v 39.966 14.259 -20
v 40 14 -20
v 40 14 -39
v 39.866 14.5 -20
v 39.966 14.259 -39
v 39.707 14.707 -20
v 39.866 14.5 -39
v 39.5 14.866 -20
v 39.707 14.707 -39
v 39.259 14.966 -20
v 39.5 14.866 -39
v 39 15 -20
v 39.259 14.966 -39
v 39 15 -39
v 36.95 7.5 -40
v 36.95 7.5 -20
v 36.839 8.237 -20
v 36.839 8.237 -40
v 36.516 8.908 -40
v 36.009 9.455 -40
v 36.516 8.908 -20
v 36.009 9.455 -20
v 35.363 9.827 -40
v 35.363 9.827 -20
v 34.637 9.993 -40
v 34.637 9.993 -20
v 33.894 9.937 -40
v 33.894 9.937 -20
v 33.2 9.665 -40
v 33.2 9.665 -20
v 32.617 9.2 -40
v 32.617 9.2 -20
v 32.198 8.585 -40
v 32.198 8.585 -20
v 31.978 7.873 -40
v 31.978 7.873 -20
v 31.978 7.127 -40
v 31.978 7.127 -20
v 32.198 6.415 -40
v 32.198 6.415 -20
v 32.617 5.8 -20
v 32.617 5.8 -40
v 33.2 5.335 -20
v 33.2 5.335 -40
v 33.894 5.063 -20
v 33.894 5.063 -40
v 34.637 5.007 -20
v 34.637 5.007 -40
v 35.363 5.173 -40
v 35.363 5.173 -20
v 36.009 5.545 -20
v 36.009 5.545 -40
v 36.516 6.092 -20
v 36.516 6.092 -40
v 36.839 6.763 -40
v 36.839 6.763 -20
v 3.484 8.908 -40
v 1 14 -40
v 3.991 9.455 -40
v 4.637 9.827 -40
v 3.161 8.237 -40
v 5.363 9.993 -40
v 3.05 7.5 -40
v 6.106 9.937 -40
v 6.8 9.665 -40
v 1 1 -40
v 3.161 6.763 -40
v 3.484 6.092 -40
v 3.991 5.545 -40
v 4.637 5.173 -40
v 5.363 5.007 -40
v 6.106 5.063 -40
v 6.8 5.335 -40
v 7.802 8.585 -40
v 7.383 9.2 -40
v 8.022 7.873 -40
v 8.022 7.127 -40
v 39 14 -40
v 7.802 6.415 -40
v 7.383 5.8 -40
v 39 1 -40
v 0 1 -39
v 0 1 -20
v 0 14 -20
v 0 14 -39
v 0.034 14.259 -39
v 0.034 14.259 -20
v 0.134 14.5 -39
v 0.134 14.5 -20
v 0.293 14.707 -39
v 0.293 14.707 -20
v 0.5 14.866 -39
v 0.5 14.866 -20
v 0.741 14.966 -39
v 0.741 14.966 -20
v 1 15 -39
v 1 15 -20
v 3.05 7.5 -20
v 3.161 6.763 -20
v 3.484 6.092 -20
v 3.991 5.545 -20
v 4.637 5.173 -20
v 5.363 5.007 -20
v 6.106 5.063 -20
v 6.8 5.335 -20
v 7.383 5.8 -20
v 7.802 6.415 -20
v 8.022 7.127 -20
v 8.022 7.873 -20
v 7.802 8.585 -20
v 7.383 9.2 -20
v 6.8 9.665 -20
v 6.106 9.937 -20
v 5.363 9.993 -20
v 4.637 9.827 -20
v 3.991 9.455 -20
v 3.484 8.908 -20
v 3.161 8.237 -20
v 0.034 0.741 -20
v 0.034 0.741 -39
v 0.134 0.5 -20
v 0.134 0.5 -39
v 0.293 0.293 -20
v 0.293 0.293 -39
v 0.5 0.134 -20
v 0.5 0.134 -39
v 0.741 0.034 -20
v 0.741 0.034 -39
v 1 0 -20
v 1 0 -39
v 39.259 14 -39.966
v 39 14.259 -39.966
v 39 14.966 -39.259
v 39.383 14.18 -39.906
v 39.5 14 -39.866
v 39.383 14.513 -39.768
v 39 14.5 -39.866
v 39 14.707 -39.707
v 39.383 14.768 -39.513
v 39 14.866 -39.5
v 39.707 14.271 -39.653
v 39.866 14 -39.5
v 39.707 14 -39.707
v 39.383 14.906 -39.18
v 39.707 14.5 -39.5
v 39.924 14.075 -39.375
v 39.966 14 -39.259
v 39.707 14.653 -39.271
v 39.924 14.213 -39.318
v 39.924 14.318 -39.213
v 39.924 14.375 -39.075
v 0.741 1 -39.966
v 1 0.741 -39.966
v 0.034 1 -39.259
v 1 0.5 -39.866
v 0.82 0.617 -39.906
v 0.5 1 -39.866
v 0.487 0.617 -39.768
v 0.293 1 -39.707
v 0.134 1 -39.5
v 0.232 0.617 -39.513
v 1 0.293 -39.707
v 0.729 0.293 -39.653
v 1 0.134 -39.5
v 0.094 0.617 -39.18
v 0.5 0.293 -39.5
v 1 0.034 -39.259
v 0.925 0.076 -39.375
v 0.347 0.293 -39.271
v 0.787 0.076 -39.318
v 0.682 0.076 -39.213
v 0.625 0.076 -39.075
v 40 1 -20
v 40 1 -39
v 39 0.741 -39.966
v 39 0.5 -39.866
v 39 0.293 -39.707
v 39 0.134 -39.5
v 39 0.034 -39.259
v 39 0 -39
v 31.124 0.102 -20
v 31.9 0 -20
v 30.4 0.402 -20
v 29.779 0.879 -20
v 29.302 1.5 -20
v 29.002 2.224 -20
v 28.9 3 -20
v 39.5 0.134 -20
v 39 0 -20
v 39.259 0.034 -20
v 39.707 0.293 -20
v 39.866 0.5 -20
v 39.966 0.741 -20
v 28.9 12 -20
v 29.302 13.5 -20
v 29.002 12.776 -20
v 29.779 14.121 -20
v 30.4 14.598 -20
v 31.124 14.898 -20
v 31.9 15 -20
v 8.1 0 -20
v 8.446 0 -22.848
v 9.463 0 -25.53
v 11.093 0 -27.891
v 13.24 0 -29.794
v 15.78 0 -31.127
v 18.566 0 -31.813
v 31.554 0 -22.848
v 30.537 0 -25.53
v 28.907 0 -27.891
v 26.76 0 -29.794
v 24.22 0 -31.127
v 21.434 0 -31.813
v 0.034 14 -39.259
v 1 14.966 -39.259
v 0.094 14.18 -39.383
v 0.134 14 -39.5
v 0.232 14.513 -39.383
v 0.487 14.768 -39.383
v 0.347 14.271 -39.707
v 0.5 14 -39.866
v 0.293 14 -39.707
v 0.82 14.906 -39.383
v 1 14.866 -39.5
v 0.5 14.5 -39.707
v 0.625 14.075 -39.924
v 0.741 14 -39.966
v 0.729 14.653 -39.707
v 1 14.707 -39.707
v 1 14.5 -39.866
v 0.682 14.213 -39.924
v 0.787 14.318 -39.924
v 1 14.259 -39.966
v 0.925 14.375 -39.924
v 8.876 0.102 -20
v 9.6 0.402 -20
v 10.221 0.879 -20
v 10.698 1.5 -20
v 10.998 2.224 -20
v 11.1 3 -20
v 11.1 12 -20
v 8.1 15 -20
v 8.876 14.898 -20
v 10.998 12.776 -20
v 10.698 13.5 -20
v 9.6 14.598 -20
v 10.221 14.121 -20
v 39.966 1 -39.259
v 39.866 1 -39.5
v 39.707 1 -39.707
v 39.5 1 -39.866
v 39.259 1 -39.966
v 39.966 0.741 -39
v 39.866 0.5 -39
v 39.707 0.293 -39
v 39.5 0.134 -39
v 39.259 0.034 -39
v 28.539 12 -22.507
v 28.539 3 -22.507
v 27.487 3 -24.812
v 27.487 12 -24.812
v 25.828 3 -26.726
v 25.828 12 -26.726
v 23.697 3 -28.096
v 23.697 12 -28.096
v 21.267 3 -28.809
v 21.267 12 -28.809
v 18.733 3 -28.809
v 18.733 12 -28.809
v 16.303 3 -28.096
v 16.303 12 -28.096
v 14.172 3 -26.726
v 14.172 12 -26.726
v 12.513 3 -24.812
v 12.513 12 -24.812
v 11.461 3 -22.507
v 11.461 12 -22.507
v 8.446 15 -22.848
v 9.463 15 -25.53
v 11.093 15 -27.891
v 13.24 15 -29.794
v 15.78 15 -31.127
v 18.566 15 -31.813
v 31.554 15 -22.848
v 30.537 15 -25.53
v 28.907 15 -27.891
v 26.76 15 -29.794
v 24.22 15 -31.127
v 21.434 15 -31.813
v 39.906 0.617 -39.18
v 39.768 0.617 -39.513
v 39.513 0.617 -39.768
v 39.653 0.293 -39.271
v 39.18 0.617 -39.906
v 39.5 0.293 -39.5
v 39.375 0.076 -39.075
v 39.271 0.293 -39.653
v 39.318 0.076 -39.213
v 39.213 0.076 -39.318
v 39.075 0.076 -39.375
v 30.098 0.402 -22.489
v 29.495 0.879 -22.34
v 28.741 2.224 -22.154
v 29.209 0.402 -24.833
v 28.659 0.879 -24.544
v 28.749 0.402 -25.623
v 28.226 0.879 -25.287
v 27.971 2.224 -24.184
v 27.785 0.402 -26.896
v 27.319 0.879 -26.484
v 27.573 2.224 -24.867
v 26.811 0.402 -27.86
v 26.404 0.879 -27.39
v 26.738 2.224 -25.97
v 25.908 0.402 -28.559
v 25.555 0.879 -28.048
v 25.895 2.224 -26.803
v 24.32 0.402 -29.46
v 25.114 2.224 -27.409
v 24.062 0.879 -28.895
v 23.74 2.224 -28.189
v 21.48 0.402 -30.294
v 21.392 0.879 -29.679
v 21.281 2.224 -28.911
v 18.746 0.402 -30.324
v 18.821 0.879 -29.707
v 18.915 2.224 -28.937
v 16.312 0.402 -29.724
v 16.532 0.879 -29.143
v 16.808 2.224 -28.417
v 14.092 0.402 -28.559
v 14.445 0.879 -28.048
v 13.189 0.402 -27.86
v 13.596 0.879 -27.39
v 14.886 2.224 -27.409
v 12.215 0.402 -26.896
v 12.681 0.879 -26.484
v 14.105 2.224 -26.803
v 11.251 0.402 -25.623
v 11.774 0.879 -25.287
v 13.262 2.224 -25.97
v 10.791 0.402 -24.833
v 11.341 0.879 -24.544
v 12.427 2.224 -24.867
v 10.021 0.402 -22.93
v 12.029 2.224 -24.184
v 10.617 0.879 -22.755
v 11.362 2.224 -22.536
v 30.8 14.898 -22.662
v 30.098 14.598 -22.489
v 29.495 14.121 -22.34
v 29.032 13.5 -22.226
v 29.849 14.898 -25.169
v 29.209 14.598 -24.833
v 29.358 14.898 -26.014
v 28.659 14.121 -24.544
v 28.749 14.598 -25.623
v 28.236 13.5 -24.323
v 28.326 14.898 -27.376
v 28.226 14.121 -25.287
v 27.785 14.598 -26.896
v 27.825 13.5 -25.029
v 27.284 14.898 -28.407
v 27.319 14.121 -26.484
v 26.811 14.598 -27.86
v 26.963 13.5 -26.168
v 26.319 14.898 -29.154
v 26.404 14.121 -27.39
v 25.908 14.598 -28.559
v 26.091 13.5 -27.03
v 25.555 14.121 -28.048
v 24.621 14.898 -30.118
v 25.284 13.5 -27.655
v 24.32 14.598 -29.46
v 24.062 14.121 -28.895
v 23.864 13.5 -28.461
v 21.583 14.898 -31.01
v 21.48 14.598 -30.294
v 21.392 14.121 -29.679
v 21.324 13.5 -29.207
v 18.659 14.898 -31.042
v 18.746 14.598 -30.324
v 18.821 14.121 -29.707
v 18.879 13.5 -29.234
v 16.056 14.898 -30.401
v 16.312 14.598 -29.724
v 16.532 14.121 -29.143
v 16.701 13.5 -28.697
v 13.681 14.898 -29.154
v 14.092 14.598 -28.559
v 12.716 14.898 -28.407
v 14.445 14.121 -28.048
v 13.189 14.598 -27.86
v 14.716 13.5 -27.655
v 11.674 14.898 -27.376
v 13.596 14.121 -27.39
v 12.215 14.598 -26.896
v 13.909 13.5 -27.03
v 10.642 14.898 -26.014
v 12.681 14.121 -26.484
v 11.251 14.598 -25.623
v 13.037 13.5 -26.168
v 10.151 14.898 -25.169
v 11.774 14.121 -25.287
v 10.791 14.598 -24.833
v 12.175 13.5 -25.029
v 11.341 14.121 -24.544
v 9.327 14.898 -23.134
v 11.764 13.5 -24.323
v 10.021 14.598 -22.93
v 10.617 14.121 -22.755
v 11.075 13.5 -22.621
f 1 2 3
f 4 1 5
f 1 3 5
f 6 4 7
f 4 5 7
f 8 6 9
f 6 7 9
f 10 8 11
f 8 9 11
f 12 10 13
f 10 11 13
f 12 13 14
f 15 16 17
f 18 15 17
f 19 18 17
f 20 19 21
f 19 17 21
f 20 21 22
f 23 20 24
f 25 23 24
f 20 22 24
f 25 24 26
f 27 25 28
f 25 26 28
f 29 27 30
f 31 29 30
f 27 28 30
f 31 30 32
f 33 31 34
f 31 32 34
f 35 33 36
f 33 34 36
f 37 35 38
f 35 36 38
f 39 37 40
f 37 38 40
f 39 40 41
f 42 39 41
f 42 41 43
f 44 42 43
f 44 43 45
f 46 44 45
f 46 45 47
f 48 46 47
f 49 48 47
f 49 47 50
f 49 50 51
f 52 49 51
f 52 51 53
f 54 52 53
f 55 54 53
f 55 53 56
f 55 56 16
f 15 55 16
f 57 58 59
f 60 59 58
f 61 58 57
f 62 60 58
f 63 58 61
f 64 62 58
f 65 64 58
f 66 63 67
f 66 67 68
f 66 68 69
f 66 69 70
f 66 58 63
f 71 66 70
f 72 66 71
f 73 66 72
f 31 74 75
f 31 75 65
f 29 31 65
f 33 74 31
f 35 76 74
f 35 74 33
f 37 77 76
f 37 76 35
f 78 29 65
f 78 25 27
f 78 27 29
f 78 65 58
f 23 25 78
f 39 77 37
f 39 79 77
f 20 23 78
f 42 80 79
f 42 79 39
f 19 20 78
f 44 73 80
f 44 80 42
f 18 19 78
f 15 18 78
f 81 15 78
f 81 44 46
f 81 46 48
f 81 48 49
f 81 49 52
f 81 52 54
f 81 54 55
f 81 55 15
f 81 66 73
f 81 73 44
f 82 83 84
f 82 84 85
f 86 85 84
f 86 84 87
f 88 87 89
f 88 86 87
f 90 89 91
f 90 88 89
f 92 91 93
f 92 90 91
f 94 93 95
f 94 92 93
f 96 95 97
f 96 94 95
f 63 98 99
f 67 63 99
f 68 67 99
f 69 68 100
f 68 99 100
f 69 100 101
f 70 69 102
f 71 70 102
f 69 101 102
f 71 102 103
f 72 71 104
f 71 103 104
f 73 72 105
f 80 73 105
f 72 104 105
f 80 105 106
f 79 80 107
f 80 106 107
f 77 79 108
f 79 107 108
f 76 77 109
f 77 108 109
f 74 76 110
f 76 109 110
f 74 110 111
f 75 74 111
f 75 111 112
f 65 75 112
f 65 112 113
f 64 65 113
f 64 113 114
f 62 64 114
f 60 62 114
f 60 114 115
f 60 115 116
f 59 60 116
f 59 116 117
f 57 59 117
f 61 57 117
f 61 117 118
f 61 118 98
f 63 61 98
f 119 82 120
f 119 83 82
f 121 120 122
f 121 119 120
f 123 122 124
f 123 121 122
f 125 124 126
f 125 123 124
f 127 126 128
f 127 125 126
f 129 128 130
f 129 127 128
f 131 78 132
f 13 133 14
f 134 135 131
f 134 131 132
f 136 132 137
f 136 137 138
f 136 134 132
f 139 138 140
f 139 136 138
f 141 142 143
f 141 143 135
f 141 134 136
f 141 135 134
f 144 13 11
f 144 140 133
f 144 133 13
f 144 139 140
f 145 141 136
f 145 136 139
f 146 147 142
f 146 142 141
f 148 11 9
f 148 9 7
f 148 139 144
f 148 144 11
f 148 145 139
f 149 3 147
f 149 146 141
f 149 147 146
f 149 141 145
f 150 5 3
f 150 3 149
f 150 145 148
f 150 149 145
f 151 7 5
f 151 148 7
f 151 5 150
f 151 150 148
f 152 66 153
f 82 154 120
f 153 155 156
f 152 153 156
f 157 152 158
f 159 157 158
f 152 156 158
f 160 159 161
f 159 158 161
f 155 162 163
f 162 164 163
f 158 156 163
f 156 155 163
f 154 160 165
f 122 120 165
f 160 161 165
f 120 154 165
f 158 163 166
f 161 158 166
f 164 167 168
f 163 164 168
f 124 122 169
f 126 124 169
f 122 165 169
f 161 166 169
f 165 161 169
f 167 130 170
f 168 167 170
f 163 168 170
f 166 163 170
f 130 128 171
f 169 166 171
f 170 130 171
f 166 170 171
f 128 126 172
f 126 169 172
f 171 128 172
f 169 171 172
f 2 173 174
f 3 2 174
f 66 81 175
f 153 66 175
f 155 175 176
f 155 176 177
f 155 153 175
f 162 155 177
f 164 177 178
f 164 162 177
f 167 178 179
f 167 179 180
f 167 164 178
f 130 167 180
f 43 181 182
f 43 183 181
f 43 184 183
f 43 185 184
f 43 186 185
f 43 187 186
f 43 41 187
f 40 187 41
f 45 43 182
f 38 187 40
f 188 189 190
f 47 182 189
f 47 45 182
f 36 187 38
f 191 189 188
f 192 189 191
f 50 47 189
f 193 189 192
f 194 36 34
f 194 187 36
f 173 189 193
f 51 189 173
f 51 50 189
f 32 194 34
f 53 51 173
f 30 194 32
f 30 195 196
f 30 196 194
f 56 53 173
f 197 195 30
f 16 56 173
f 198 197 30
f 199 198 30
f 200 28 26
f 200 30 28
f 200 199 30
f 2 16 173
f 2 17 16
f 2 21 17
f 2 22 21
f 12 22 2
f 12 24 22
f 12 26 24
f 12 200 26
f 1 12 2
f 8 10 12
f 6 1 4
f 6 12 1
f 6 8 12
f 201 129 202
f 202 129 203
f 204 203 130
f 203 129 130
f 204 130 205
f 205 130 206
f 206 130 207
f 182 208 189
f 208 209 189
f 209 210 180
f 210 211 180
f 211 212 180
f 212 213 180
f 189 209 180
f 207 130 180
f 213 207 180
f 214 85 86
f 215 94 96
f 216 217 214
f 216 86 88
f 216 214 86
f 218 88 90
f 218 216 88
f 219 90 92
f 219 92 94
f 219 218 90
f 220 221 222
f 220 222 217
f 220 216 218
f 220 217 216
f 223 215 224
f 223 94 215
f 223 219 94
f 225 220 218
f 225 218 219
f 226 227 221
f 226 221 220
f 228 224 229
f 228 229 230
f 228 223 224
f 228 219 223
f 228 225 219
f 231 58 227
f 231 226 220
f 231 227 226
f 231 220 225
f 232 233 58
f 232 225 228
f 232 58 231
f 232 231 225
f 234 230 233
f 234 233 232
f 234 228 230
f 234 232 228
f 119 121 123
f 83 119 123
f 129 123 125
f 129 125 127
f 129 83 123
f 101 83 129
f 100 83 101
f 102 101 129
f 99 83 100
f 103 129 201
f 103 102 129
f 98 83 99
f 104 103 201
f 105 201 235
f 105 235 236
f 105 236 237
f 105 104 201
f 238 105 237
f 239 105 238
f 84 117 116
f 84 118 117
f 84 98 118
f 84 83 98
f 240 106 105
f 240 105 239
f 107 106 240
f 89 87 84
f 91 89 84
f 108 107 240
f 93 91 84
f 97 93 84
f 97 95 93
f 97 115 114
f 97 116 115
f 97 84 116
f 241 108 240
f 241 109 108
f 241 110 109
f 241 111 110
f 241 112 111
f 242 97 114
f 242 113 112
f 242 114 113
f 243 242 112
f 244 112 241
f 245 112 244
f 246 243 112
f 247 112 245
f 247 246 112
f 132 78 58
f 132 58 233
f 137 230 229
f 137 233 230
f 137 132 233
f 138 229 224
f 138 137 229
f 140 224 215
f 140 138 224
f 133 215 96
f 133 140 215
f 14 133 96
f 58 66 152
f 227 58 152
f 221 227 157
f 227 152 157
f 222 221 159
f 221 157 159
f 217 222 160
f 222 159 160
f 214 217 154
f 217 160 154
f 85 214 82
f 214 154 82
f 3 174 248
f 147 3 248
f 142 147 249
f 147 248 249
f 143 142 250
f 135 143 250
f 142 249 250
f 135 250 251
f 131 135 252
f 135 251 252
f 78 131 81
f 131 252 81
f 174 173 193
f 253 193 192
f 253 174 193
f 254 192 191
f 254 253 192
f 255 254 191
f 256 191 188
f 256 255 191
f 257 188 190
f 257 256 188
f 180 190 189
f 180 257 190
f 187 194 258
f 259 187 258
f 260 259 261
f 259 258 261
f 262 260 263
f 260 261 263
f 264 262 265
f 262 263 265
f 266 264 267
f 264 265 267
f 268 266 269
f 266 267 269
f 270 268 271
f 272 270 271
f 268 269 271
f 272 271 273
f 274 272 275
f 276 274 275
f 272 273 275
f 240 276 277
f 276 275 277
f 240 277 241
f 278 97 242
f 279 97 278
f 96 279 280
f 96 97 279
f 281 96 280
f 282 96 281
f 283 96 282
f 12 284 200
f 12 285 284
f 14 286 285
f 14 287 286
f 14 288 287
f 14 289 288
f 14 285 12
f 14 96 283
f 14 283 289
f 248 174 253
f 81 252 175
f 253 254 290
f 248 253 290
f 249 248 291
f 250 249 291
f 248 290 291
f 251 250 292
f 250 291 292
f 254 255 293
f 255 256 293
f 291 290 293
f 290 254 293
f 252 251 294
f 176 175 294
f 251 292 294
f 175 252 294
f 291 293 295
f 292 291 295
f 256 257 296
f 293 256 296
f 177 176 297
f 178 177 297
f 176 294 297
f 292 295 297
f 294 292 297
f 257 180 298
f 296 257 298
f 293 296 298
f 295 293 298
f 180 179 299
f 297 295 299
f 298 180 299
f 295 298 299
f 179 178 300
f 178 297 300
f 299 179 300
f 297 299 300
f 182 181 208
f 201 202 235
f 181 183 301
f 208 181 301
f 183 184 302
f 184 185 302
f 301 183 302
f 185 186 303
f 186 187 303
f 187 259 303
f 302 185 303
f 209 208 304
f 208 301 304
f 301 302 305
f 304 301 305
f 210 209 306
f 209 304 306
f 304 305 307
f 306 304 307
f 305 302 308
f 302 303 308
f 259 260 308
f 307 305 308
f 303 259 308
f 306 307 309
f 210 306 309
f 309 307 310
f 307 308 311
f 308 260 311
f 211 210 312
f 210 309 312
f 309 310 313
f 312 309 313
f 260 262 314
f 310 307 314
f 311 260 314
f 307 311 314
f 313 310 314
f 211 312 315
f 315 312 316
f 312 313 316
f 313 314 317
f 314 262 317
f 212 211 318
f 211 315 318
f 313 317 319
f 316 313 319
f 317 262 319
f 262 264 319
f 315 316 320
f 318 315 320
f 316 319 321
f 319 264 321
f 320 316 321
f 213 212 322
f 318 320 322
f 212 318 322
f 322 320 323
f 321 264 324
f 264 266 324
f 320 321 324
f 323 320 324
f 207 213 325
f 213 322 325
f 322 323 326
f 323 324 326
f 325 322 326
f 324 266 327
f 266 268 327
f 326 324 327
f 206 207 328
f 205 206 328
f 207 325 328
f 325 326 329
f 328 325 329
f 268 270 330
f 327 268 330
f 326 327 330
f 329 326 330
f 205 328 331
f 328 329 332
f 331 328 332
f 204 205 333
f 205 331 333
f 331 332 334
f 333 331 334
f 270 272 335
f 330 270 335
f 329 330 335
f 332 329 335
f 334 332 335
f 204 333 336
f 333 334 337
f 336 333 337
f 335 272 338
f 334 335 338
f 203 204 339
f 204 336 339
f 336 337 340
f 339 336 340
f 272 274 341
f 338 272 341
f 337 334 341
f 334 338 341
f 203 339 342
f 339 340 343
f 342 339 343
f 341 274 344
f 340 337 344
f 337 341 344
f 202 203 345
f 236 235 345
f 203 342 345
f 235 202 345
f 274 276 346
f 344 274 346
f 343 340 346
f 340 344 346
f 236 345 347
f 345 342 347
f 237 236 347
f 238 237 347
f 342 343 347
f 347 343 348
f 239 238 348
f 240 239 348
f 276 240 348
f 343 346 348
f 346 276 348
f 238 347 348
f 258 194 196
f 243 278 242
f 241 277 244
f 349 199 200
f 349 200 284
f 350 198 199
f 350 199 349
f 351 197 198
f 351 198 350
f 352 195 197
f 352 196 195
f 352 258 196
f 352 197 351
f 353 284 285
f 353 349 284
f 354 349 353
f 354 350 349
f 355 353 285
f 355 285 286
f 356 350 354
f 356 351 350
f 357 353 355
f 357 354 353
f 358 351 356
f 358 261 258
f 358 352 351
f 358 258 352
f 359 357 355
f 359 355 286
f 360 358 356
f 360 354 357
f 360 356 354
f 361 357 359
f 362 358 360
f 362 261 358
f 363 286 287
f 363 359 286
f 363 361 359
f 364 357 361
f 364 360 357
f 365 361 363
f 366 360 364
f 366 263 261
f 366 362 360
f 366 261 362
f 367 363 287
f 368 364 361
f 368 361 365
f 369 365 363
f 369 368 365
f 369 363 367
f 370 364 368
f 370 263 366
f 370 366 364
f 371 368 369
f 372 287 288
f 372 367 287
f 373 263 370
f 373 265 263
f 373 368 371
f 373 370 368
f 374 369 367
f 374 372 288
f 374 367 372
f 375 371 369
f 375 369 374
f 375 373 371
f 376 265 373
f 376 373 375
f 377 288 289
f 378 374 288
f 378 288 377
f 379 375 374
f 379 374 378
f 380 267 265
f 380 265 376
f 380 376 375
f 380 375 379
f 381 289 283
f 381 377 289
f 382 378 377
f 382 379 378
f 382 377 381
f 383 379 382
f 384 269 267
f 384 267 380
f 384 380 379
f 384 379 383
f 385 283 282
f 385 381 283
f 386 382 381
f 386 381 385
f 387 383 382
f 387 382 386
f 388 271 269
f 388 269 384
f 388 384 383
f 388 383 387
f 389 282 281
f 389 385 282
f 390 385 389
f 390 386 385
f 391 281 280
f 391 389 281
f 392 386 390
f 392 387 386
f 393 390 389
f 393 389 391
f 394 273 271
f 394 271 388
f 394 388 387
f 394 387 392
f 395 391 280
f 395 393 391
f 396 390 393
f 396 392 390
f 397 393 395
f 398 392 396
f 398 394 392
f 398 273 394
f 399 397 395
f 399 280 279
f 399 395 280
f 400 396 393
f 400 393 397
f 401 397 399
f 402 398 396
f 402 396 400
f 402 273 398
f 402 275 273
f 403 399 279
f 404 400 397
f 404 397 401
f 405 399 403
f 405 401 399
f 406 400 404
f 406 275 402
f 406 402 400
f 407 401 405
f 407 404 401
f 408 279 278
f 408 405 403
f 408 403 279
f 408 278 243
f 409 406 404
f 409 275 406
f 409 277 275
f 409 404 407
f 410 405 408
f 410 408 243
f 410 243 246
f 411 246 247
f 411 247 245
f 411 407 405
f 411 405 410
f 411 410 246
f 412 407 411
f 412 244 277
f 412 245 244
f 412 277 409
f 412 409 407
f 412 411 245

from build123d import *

# Parameters (mm, degrees)
SKETCH_1_W          = 40
SKETCH_1_H          = 40
EXTRUDE_1_DEPTH     = 15
SKETCH_3_R          = 8.9
CUT_EXTRUDE_1_DEPTH = 59.523499554
SKETCH_5_R          = 2.5
CUT_EXTRUDE_2_DEPTH = 59.523499554
SKETCH_6_W          = 40
SKETCH_6_H          = 20
CUT_EXTRUDE_3_DEPTH = 59.523499554
FILLET_1_R          = 3
FILLET_2_R          = 1
FILLET_3_R          = 1
FILLET_4_R          = 1


with BuildPart() as part:
    # 草圖1 → 填料-伸長1 (new body)
    with BuildSketch(Plane(origin=(0, 0, 0), x_dir=(1, 0, 0), z_dir=(0, 1, 0))):
        with Locations((20, 20)):
            Rectangle(SKETCH_1_W, SKETCH_1_H)
    extrude(amount=EXTRUDE_1_DEPTH)

    # 草圖3 → 除料-伸長1 (cut, through all)
    with BuildSketch(Plane(origin=(0, 15, 0), x_dir=(1, 0, 0), z_dir=(0, 1, 0))):
        with Locations(Location((20, 20, 0), (0, 0, 270))):
            Circle(SKETCH_3_R)
    extrude(amount=-CUT_EXTRUDE_1_DEPTH, mode=Mode.SUBTRACT)

    # 草圖5 → 除料-伸長2 (cut, through all)
    with BuildSketch(Plane.XY):
        with Locations((34.45, 7.5)):
            Circle(SKETCH_5_R)
        with Locations(Location((5.55, 7.5, 0), (0, 0, 180))):
            Circle(SKETCH_5_R)
    extrude(amount=-CUT_EXTRUDE_2_DEPTH, mode=Mode.SUBTRACT)

    # 草圖6 → 除料-伸長3 (cut, through all)
    with BuildSketch(Plane(origin=(0, 15, 0), x_dir=(1, 0, 0), z_dir=(0, 1, 0))):
        with Locations((20, 10)):
            Rectangle(SKETCH_6_W, SKETCH_6_H)
    extrude(amount=-CUT_EXTRUDE_3_DEPTH, mode=Mode.SUBTRACT)

    # 圓角1
    fillet_1_edges = [part.edges().sort_by_distance(p)[0] for p in [
        (20, 0, -28.9),
        (20, 15, -28.9),
    ]]
    fillet(fillet_1_edges, radius=FILLET_1_R)

    # 圓角2
    fillet_2_edges = [part.edges().sort_by_distance(p)[0] for p in [
        (20, 15, -40),
        (40, 15, -30),
        (0, 15, -30),
    ]]
    fillet(fillet_2_edges, radius=FILLET_2_R)

    # 圓角3
    # the kernel refuses this fillet: 1 mm, written as the material it takes off along each edge
    with BuildSketch(Plane(origin=(39, 14, -39), x_dir=(0, 0, -1), z_dir=(1, 0, 0))) as fillet_3_piece_1_section:
        Polygon((0, 0), (FILLET_3_R, 0), (FILLET_3_R, FILLET_3_R), (0, FILLET_3_R), align=None)
    fillet_3_piece_1 = extrude(amount=FILLET_3_R, mode=Mode.PRIVATE)
    fillet_3_piece_1 = fillet_3_piece_1 - Plane(origin=(39, 14, -39), x_dir=(0, -0.7071067811865475, 0.7071067811865475), z_dir=(1, 0, 0)) * Sphere(FILLET_3_R, mode=Mode.PRIVATE)
    add(fillet_3_piece_1, mode=Mode.SUBTRACT)
    with BuildSketch(Plane(origin=(1, 14, -39), x_dir=(-1, 0, 0), z_dir=(0, 0, -1))) as fillet_3_piece_2_section:
        Polygon((0, 0), (FILLET_3_R, 0), (FILLET_3_R, FILLET_3_R), (0, FILLET_3_R), align=None)
    fillet_3_piece_2 = extrude(amount=FILLET_3_R, mode=Mode.PRIVATE)
    fillet_3_piece_2 = fillet_3_piece_2 - Plane(origin=(1, 14, -39), x_dir=(0.7071067811865475, -0.7071067811865475, 0), z_dir=(0, 0, -1)) * Sphere(FILLET_3_R, mode=Mode.PRIVATE)
    add(fillet_3_piece_2, mode=Mode.SUBTRACT)
    with BuildSketch(Plane(origin=(0, -2.5, -40), x_dir=(1, 0, 0), z_dir=(0, 1, 0)), Plane(origin=(40, -2.5, -40), x_dir=(0, 0, 1), z_dir=(0, 1, 0))) as fillet_3_piece_3:
        with BuildLine():
            CenterArc((FILLET_3_R, -FILLET_3_R), FILLET_3_R, 90, 90)
            Line((0, -FILLET_3_R), (0, 0))
            Line((0, 0), (FILLET_3_R, 0))
        make_face()
    extrude(amount=16.5, mode=Mode.SUBTRACT)

    # 圓角4
    fillet_4_edges = [part.edges().sort_by_distance(p)[0] for p in [
        (40, 0, -29.5),
        (20, 0, -40),
        (0, 0, -29.5),
        (0.292893219, 0, -39.707106781),
        (39.707106781, 0, -39.707106781),
    ]]
    fillet(fillet_4_edges, radius=FILLET_4_R)


solid = part.part
